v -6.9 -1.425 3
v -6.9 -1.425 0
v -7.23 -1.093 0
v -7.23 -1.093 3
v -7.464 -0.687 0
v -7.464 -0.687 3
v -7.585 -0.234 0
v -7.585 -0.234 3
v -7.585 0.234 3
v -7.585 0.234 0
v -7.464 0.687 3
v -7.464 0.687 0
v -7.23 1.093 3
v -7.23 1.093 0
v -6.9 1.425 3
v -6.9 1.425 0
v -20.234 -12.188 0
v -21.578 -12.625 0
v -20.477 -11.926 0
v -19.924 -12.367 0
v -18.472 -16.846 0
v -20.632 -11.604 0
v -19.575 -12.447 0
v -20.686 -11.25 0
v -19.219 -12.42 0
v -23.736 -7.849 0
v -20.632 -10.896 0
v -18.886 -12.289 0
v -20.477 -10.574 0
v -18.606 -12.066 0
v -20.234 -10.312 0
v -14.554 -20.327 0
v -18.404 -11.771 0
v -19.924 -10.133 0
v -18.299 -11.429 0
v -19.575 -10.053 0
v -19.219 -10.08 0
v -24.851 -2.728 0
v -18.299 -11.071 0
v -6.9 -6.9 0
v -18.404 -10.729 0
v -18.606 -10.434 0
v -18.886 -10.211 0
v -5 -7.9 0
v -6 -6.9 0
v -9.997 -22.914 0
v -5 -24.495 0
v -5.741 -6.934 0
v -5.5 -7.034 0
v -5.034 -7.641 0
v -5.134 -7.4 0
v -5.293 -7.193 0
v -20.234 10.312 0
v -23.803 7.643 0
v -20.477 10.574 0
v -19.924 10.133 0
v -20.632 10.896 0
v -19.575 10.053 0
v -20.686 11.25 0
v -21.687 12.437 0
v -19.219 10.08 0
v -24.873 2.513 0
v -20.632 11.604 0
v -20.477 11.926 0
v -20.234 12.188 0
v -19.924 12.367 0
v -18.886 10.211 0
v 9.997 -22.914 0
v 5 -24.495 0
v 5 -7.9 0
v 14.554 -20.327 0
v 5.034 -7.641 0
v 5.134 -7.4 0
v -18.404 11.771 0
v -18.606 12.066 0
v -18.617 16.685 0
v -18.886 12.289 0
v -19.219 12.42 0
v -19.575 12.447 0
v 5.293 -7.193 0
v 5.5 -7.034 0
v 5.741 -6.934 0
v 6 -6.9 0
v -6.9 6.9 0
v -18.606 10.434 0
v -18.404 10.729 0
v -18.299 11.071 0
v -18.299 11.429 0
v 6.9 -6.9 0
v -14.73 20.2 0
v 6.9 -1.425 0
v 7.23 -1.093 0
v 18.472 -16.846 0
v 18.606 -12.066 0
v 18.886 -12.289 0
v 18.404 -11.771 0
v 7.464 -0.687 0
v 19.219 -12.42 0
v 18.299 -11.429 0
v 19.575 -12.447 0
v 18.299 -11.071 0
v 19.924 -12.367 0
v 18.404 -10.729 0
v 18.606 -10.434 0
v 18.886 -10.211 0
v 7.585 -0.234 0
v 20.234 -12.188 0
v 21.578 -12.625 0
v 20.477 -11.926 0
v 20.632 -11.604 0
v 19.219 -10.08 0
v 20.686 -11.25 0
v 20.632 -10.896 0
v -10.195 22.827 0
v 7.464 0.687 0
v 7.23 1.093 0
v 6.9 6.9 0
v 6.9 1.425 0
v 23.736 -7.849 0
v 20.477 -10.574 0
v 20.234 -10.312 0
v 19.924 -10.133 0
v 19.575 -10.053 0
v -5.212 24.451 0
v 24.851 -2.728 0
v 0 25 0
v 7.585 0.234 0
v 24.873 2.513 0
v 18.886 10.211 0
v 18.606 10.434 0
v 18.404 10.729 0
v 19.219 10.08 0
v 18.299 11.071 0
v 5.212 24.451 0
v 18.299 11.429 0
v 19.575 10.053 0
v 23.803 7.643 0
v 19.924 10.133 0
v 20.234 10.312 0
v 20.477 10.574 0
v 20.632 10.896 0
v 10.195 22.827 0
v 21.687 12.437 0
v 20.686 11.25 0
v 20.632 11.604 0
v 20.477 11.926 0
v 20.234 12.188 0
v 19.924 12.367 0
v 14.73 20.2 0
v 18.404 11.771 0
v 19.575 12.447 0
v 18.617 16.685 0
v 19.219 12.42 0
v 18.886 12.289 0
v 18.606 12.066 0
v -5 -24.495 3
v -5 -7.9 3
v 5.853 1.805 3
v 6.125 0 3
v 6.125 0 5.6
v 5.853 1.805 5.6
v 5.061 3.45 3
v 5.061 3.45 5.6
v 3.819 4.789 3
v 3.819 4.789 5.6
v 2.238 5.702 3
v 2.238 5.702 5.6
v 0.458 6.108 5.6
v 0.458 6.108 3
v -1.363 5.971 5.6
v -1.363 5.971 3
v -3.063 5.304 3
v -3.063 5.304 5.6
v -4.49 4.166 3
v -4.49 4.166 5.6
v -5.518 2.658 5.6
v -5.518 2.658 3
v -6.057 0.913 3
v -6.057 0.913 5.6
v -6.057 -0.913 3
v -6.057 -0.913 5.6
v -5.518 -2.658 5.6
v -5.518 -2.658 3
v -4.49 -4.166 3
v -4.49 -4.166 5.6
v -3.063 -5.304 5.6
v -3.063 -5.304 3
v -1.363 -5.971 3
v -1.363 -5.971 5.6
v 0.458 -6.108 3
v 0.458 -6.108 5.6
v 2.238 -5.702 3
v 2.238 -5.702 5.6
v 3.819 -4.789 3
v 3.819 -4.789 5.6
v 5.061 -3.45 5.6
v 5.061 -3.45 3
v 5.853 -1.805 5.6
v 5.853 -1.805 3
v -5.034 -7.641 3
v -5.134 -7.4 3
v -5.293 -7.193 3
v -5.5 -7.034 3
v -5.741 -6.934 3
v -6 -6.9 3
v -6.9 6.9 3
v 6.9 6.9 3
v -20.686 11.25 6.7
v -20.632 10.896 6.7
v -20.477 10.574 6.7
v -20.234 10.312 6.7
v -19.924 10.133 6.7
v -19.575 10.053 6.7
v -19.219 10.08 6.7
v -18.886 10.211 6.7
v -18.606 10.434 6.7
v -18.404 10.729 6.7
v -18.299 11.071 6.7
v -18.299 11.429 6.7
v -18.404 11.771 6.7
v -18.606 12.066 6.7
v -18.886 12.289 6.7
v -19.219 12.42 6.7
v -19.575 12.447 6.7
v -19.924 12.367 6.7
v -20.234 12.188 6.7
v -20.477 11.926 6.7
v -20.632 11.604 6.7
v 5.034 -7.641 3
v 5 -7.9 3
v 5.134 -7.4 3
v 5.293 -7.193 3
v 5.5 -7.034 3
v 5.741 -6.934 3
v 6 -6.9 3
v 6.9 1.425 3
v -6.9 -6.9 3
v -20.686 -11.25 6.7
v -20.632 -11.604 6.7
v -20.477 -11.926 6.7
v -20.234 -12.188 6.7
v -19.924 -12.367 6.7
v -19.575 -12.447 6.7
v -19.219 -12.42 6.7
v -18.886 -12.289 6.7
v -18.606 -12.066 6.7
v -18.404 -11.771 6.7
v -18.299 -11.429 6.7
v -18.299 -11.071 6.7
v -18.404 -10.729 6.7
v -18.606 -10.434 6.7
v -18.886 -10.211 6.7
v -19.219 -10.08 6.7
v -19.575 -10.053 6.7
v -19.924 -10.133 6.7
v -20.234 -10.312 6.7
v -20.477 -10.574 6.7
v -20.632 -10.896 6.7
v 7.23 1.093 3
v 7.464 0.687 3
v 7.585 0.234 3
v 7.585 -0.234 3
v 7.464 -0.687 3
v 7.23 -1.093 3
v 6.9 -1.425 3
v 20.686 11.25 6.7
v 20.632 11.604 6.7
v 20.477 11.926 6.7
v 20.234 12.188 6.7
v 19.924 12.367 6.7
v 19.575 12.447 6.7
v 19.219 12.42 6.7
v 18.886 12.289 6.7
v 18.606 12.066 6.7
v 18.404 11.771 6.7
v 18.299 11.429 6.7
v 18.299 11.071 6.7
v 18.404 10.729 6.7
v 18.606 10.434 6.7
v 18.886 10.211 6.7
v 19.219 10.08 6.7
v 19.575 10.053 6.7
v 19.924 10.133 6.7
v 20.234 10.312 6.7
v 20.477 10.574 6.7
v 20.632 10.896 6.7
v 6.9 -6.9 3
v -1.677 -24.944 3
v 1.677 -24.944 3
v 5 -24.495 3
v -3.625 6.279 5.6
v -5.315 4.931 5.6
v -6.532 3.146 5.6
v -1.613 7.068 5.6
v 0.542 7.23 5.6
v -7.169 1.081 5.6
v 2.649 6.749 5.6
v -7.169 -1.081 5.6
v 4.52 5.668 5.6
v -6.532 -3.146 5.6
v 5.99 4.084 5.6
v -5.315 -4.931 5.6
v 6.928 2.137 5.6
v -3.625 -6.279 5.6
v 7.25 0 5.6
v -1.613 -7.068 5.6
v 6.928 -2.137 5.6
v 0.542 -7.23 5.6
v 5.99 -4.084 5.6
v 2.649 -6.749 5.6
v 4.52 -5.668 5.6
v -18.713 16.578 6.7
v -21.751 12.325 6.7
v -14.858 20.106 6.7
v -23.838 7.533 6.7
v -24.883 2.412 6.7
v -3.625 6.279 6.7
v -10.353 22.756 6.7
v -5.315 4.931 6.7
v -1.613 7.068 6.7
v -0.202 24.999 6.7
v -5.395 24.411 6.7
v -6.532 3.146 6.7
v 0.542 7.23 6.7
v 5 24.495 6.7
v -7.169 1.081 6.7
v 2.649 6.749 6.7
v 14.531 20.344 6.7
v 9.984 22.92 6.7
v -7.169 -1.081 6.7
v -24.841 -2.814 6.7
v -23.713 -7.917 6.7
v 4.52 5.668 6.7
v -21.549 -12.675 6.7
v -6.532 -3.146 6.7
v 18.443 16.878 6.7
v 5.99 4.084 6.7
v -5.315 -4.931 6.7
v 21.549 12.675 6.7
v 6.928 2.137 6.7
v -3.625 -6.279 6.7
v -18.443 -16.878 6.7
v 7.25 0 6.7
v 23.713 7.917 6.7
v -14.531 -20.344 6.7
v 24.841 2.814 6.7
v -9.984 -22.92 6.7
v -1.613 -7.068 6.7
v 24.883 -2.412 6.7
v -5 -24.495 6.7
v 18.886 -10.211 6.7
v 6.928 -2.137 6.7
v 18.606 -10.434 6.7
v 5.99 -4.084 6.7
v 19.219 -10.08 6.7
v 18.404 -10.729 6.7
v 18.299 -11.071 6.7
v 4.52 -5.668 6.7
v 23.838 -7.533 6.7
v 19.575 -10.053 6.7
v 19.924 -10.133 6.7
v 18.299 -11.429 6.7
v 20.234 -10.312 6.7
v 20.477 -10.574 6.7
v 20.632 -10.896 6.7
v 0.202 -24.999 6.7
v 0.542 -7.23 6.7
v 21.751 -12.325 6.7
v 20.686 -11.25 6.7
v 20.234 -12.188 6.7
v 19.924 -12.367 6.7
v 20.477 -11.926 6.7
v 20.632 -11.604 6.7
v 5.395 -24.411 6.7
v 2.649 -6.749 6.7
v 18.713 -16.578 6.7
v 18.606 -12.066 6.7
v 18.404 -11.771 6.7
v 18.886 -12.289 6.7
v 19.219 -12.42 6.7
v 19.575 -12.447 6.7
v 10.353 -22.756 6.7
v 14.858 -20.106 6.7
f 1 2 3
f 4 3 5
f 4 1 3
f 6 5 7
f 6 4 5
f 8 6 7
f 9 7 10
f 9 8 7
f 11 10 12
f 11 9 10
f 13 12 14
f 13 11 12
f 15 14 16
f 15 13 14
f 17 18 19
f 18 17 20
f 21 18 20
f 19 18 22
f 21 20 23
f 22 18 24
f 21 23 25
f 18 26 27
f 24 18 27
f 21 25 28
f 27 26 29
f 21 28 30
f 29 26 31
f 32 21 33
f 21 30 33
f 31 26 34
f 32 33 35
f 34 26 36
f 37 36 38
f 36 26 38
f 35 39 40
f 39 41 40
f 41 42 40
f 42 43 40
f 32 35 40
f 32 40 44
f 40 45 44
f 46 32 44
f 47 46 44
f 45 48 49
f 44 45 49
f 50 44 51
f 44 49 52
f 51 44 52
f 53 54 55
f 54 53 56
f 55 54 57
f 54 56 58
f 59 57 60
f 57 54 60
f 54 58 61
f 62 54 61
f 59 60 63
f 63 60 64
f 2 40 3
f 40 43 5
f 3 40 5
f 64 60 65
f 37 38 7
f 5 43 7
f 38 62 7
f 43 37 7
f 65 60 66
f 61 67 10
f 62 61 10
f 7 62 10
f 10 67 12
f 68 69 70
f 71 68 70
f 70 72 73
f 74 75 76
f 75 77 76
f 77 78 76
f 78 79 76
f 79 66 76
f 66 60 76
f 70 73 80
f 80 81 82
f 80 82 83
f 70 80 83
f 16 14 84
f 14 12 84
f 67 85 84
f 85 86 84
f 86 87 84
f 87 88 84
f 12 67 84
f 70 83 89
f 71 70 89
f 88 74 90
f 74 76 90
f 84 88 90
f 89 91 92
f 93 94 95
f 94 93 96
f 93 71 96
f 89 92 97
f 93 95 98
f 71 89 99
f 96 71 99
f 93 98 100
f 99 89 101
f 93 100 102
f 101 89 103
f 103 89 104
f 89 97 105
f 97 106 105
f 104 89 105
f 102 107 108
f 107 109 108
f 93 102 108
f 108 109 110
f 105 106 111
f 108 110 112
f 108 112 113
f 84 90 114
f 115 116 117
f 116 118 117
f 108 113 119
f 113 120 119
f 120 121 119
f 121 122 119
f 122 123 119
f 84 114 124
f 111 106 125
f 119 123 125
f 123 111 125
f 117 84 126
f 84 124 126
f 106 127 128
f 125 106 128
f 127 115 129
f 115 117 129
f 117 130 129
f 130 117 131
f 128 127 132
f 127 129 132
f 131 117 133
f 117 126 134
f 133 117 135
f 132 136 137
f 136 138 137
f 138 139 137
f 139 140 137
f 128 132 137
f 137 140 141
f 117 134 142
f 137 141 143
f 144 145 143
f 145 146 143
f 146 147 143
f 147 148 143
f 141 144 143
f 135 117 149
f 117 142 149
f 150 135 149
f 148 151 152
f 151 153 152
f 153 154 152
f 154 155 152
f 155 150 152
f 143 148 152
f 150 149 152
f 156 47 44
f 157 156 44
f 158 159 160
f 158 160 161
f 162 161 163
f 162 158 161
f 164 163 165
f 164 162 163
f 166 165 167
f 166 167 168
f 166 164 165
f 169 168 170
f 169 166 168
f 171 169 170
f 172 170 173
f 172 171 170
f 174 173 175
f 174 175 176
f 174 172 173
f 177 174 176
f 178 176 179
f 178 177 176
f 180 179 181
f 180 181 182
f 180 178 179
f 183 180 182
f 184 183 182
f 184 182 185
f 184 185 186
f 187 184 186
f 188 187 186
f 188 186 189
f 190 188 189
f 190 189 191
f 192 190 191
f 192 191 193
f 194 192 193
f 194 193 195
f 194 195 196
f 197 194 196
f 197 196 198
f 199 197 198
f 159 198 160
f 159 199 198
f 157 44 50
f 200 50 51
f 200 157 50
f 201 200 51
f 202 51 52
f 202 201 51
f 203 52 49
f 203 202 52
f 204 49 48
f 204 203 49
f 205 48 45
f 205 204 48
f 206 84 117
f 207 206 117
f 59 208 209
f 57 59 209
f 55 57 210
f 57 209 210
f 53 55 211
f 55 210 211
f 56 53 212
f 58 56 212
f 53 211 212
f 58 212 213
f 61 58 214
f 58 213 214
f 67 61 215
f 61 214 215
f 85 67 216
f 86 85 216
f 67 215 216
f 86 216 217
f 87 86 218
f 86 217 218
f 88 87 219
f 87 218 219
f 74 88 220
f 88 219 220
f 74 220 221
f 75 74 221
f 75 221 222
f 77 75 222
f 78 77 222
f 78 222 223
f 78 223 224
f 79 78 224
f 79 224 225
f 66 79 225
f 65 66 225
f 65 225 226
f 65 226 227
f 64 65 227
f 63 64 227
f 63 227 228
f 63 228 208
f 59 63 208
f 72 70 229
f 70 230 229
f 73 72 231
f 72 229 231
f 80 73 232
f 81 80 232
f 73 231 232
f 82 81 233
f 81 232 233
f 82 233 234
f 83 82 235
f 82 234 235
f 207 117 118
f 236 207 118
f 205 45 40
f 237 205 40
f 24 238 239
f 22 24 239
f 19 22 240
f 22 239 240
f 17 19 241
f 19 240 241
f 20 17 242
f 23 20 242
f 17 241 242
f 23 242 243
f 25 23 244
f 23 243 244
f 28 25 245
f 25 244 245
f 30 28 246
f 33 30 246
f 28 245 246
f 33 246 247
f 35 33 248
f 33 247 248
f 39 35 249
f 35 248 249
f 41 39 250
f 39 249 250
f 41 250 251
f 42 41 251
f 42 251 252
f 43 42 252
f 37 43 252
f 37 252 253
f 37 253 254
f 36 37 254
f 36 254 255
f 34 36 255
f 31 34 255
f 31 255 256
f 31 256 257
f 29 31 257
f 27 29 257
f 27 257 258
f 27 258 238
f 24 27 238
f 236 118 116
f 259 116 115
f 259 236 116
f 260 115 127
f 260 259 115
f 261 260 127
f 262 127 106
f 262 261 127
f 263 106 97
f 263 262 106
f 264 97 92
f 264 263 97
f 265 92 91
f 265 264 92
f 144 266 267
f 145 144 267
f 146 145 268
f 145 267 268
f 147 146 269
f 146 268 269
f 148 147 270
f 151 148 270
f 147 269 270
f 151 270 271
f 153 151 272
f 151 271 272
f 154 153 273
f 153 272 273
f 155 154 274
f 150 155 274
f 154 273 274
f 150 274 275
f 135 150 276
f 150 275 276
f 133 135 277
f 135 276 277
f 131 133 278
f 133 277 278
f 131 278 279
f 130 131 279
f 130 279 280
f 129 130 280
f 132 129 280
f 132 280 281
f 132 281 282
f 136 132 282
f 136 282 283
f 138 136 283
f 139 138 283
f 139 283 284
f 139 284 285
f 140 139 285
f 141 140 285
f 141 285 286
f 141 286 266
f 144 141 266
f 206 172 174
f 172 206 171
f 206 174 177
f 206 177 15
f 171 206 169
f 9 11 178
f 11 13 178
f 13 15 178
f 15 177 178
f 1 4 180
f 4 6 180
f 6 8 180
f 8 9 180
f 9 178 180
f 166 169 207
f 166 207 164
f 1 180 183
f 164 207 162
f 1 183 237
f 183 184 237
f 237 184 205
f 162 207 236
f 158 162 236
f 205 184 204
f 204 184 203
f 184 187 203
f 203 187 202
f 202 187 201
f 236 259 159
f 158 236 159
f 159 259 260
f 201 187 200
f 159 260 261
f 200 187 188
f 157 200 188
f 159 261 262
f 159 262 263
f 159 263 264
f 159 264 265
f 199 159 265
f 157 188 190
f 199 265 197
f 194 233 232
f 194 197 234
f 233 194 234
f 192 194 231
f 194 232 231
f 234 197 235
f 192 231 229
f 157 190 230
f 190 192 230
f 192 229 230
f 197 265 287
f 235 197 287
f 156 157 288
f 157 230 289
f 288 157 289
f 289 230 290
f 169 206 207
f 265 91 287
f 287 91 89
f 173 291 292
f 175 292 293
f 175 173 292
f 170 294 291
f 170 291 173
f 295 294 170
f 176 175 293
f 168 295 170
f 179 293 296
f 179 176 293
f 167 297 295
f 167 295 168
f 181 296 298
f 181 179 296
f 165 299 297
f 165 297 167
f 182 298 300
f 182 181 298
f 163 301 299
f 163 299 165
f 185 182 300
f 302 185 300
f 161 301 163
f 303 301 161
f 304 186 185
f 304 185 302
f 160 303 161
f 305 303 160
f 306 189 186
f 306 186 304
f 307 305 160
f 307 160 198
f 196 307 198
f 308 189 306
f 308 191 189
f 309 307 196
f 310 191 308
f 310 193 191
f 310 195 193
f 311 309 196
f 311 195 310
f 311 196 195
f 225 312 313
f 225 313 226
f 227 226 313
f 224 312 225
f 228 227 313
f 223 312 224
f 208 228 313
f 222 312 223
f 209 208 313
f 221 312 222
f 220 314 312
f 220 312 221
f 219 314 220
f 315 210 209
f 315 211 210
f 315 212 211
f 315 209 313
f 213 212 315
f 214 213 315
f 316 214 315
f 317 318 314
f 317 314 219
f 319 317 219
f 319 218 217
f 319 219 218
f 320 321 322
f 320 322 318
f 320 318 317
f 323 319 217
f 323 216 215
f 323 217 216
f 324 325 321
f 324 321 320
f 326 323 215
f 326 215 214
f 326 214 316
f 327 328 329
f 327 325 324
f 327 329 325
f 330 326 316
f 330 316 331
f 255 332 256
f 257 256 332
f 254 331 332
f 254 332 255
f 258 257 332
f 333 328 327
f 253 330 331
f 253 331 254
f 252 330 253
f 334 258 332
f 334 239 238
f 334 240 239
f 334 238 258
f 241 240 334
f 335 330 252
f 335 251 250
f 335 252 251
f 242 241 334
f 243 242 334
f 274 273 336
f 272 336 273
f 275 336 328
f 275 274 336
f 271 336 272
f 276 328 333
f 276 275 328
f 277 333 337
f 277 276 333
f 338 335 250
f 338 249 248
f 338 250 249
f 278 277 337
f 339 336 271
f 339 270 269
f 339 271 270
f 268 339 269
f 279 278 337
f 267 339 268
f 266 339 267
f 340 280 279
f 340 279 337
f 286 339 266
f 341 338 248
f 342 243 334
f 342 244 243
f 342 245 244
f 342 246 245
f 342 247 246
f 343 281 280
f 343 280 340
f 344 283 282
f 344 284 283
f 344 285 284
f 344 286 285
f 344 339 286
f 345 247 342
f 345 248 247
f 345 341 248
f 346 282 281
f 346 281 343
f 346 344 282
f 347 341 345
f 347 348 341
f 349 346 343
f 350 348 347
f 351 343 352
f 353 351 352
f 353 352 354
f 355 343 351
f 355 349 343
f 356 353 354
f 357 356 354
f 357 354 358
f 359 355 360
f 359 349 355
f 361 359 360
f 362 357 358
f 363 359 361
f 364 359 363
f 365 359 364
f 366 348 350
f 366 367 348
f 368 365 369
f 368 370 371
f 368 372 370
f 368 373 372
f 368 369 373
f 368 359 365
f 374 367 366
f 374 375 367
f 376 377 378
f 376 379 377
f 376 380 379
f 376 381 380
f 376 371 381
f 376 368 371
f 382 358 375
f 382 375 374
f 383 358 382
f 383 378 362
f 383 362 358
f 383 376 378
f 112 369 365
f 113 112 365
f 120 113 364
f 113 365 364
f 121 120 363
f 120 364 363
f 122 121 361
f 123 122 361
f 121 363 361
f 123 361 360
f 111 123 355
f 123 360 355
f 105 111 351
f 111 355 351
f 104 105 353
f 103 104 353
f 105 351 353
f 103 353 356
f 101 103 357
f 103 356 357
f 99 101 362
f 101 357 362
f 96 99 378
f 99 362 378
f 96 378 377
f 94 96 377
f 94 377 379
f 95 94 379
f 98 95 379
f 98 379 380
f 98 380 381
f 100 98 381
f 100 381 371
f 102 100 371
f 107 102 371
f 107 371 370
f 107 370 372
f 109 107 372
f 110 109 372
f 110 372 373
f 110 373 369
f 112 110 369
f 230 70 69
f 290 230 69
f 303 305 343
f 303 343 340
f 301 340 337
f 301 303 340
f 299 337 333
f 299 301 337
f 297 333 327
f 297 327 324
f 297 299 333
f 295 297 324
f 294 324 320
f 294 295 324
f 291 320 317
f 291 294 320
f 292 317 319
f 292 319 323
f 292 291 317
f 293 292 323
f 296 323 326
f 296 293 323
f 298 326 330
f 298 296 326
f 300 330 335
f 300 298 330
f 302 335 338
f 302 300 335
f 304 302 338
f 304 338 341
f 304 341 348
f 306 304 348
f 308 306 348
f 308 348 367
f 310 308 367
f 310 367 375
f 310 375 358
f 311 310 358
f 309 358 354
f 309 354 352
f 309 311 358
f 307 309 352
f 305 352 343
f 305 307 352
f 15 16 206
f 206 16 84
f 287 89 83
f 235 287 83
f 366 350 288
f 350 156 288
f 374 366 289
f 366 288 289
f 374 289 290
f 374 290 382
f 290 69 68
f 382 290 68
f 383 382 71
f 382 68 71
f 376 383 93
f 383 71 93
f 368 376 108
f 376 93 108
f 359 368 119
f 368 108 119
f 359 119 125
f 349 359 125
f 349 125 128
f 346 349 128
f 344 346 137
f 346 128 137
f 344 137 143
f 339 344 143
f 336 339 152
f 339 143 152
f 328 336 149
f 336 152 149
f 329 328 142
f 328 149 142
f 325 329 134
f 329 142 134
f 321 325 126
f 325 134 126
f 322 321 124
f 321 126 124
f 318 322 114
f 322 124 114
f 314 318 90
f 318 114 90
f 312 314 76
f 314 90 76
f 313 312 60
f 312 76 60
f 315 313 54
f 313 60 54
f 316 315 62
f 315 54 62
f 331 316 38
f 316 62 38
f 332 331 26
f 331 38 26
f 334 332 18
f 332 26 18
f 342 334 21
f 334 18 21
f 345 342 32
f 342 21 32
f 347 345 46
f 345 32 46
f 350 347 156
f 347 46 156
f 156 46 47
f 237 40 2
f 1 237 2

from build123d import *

# Parameters (mm, degrees)
EXTRUDE_1_DEPTH     = 3
CUT_EXTRUDE_4_DEPTH = 36.482389998
SKETCH_12_R         = 25
SKETCH_12_R_2       = 6.125
EXTRUDE_2_DEPTH     = 2.6
SKETCH_13_R         = 25
SKETCH_13_R_2       = 7.25
EXTRUDE_3_DEPTH     = 1.1
SKETCH_14_R         = 1.2
CUT_EXTRUDE_5_DEPTH = 36.984580031
FILLET_1_R          = 1


with BuildPart() as part:
    # 스케치1 → 보스-돌출1 (new body)
    with BuildSketch(Plane.XY):
        with BuildLine():
            Line((-5, -6.9), (-6.9, -6.9))
            Line((-6.9, -6.9), (-6.9, 6.9))
            Line((-6.9, 6.9), (6.9, 6.9))
            Line((6.9, 6.9), (6.9, -6.9))
            Line((6.9, -6.9), (5, -6.9))
            Line((5, -6.9), (5, -24.494897428))
            ThreePointArc((5, -24.494897428), (0, 25), (-5, -24.494897428))
            Line((-5, -24.494897428), (-5, -6.9))
        make_face()
    extrude(amount=EXTRUDE_1_DEPTH)

    # 스케치11 → 컷-돌출4 (cut, through all)
    with BuildSketch(Plane.XY.offset(3)):
        with BuildLine():
            Line((5.8, -1.8), (-5.8, -1.8))
            ThreePointArc((-5.8, -1.8), (-7.6, 0), (-5.8, 1.8))
            Line((-5.8, 1.8), (5.8, 1.8))
            ThreePointArc((5.8, 1.8), (7.6, 0), (5.8, -1.8))
        make_face()
    extrude(amount=-CUT_EXTRUDE_4_DEPTH, mode=Mode.SUBTRACT)

    # 스케치12 → 보스-돌출2 (add)
    with BuildSketch(Plane.XY.offset(3)):
        with Locations(Location((0, 0, 0), (0, 0, 258.463040967))):
            Circle(SKETCH_12_R)
        Circle(SKETCH_12_R_2, mode=Mode.SUBTRACT)
    extrude(amount=EXTRUDE_2_DEPTH)

    # 스케치13 → 보스-돌출3 (add)
    with BuildSketch(Plane.XY.offset(5.6)):
        with Locations(Location((0, 0, 0), (0, 0, 258.463040967))):
            Circle(SKETCH_13_R)
        Circle(SKETCH_13_R_2, mode=Mode.SUBTRACT)
    extrude(amount=EXTRUDE_3_DEPTH)

    # 스케치14 → 컷-돌출5 (cut, through all)
    with BuildSketch(Plane.XY.offset(6.7)):
        with Locations((19.485571585, -11.25)):
            Circle(SKETCH_14_R)
        with Locations((19.485571585, 11.25)):
            Circle(SKETCH_14_R)
        with Locations(Location((-19.485571585, 11.25, 0), (0, 0, 180))):
            Circle(SKETCH_14_R)
        with Locations(Location((-19.485571585, -11.25, 0), (0, 0, 180))):
            Circle(SKETCH_14_R)
    extrude(amount=-CUT_EXTRUDE_5_DEPTH, mode=Mode.SUBTRACT)

    # 필렛1
    fillet_1_edges = [part.edges().sort_by_distance(p)[0] for p in [
        (-5, -6.9, 1.5),
        (5, -6.9, 1.5),
    ]]
    fillet(fillet_1_edges, radius=FILLET_1_R)


solid = part.part
